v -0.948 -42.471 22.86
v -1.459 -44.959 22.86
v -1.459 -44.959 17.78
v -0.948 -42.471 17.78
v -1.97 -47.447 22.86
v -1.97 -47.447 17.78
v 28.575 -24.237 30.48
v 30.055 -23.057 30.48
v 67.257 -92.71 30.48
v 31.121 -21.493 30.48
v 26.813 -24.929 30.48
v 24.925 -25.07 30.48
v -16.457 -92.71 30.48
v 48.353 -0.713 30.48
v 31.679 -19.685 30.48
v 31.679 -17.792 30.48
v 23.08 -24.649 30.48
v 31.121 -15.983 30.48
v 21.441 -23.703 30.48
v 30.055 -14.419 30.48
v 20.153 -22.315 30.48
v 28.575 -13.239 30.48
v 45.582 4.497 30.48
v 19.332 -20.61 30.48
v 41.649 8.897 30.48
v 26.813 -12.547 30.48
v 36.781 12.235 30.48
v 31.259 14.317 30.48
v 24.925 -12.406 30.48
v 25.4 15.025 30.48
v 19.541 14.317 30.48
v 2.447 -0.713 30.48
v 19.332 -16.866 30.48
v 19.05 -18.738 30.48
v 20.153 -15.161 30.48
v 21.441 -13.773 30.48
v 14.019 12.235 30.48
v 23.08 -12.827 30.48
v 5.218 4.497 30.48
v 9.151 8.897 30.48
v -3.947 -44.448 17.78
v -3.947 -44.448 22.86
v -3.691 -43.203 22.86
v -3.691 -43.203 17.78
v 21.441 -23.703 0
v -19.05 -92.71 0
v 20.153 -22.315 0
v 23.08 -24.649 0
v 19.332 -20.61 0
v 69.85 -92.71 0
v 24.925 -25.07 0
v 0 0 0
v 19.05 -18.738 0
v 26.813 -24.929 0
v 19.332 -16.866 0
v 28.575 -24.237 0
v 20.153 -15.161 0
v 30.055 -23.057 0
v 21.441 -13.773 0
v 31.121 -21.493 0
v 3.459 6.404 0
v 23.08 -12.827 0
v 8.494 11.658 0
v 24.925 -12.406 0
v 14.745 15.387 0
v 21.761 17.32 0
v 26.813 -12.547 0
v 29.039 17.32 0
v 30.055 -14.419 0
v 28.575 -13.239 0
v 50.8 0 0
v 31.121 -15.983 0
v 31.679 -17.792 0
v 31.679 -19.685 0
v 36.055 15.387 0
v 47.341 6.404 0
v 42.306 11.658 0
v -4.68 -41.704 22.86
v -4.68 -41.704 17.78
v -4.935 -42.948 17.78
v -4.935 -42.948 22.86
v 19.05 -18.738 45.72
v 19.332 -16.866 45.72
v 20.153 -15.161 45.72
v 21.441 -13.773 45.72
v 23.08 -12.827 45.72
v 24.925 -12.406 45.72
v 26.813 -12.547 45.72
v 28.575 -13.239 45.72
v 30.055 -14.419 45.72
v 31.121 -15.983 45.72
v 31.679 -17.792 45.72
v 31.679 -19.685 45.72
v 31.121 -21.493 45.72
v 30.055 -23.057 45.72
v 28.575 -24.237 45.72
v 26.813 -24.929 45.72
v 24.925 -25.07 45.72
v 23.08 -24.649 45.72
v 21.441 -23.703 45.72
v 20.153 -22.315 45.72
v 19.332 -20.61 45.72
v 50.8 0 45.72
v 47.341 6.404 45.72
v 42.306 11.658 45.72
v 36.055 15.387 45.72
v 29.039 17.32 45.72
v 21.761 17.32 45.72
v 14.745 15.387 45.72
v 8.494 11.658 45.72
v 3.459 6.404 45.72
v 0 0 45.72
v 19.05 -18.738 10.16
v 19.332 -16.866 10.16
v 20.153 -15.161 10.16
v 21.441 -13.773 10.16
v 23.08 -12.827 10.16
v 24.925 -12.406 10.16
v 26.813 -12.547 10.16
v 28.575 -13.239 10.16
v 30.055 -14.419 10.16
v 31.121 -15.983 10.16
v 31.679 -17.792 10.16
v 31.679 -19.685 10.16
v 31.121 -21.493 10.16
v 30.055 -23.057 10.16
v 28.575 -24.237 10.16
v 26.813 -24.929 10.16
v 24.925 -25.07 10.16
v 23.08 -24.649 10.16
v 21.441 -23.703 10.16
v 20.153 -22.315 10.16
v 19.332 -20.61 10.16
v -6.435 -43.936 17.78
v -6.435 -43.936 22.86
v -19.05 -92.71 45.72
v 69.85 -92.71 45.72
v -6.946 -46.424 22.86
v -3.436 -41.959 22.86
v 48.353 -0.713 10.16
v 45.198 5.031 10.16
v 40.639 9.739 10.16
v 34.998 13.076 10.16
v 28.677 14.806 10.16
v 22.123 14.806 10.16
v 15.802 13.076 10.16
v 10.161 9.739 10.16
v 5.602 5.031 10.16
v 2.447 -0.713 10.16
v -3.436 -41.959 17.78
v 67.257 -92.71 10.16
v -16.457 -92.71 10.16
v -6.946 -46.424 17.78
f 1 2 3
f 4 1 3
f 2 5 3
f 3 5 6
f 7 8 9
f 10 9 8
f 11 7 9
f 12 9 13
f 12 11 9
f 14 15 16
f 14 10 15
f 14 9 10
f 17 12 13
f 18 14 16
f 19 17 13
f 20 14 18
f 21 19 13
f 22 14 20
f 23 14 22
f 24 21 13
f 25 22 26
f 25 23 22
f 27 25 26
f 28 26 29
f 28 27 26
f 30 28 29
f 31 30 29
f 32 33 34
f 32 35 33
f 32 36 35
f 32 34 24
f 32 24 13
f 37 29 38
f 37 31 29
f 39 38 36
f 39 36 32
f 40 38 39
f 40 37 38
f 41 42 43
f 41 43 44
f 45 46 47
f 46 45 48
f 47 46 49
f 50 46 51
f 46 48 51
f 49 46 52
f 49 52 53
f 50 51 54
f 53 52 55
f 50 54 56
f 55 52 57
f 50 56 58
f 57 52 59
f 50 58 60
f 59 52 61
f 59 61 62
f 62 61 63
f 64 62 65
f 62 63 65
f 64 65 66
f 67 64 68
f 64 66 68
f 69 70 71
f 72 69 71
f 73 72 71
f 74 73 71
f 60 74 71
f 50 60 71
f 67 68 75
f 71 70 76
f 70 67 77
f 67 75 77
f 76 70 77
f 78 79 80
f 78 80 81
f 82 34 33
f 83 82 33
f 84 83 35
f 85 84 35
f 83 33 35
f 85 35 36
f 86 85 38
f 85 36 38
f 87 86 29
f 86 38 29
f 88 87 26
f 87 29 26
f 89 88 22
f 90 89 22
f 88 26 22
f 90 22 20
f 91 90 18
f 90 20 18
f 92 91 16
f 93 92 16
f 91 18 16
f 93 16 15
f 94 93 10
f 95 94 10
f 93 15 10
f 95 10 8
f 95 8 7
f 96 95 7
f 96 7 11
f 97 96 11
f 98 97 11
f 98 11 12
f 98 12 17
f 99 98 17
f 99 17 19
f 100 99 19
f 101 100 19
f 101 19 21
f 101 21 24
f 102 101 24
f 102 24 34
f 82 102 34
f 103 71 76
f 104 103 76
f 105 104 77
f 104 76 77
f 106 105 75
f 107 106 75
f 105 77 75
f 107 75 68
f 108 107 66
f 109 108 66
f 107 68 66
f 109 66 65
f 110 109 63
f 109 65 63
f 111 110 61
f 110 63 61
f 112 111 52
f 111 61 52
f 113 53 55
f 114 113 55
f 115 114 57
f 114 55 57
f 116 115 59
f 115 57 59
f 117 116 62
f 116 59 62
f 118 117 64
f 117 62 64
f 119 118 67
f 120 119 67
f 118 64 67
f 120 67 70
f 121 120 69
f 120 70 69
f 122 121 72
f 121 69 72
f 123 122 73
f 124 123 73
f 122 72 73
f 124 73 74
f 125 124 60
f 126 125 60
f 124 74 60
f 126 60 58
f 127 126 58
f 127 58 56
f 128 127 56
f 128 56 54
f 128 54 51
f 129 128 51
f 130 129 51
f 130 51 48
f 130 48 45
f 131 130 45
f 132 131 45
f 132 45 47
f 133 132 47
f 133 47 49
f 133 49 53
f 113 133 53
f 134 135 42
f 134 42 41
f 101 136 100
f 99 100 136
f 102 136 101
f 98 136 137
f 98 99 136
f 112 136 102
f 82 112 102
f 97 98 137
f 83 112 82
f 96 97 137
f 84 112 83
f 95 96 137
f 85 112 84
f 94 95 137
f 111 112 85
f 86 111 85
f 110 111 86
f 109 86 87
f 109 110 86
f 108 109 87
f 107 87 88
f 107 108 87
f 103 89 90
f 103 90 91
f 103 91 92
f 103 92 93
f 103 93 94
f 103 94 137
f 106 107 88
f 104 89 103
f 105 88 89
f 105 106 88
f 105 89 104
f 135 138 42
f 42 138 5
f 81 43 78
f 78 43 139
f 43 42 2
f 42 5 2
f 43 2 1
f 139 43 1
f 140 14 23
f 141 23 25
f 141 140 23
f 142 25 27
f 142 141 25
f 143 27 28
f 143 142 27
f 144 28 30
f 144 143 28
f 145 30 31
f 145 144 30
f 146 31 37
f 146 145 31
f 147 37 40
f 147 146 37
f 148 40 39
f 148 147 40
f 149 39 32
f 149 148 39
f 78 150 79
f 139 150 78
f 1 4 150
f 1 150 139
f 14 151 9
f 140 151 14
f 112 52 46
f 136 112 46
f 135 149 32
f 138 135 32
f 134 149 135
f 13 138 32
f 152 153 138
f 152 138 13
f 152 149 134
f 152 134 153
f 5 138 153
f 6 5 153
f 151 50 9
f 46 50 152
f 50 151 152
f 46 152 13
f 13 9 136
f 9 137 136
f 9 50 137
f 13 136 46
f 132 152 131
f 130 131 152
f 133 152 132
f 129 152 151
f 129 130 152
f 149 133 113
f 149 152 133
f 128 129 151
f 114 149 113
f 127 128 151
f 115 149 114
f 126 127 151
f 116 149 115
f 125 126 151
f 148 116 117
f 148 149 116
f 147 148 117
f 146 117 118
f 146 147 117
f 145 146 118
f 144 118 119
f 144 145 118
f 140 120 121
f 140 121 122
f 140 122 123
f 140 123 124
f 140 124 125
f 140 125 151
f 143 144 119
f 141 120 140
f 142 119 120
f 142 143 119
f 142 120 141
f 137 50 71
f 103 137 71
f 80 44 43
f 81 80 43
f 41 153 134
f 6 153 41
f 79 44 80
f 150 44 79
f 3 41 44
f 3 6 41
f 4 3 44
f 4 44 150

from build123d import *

# Parameters (mm, degrees)
BOSS_EXTRUDE1_DEPTH      = 45.72
SHELL1_T                 = -2.54
SHELL1_THICKNESS_2_DEPTH = 7.62
SHELL1_THICKNESS_3_DEPTH = 7.62
BOSS_EXTRUDE2_DEPTH      = 5.08
SKETCH3_R                = 6.35
CUT_EXTRUDE1_DEPTH       = 45.72
SKETCH4_W                = 5.08
SKETCH4_H                = 2.54
BOSS_EXTRUDE3_DEPTH      = 5.08
SKETCH5_W                = 2.54
SKETCH5_H                = 5.08
BOSS_EXTRUDE4_DEPTH      = 2.54
SKETCH6_W                = 5.08
SKETCH6_H                = 1.27
BOSS_EXTRUDE5_DEPTH      = 1.27


with BuildPart() as part:
    # Sketch1 → Boss-Extrude1 (new body)
    with BuildSketch(Plane.XY):
        with BuildLine():
            Line((0, 0), (-19.05, -92.71))
            Line((-19.05, -92.71), (69.85, -92.71))
            Line((69.85, -92.71), (50.8, 0))
            ThreePointArc((50.8, 0), (25.4, 17.565060875), (0, 0))
        make_face()
    extrude(amount=BOSS_EXTRUDE1_DEPTH)

    # Shell1
    shell1_openings = [part.faces().sort_by_distance(p)[0] for p in [
        (25.4, -92.71, 22.86),
    ]]
    offset(amount=SHELL1_T, openings=shell1_openings, kind=Kind.INTERSECTION)

    # Shell1 thickness 2 face (on inner face of the shell) → Shell1 thickness 2 (add)
    with BuildSketch(Plane(origin=(25.4, -46.578295761, 43.18), x_dir=(1, 0, 0), z_dir=(0, 0, 1))):
        with BuildLine():
            Line((41.856932666, -46.131704239), (-41.856932666, -46.131704239))
            Line((-41.856932666, -46.131704239), (-22.953477125, 45.865112726))
            ThreePointArc((-22.953477125, 45.865112726), (0, 61.603356636), (22.953477125, 45.865112726))
            Line((22.953477125, 45.865112726), (41.856932666, -46.131704239))
        make_face()
    extrude(amount=-SHELL1_THICKNESS_2_DEPTH)

    # Shell1 thickness 3 face (on inner face of the shell) → Shell1 thickness 3 (add)
    with BuildSketch(Plane(origin=(25.4, -46.578295761, 2.54), x_dir=(-1, 0, 0), z_dir=(0, 0, -1))):
        with BuildLine():
            Line((41.856932666, -46.131704239), (-41.856932666, -46.131704239))
            Line((-41.856932666, -46.131704239), (-22.953477125, 45.865112726))
            ThreePointArc((-22.953477125, 45.865112726), (0, 61.603356636), (22.953477125, 45.865112726))
            Line((22.953477125, 45.865112726), (41.856932666, -46.131704239))
        make_face()
    extrude(amount=-SHELL1_THICKNESS_3_DEPTH)

    # Sketch2 → Boss-Extrude2 (add)
    with BuildSketch(Plane(origin=(0, 0, 35.56), x_dir=(-1, 0, 0), z_dir=(0, 0, -1))):
        with BuildLine():
            Line((-48.353477125, -0.713183035), (-67.256932666, -92.71))
            Line((-67.256932666, -92.71), (16.456932666, -92.71))
            Line((16.456932666, -92.71), (-2.446522875, -0.713183035))
            ThreePointArc((-2.446522875, -0.713183035), (-11.484590973, 10.712623327), (-25.4, 15.025060875))
            ThreePointArc((-25.4, 15.025060875), (-39.315409027, 10.712623327), (-48.353477125, -0.713183035))
        make_face()
    extrude(amount=BOSS_EXTRUDE2_DEPTH)

    # Sketch3 → Cut-Extrude1 (cut)
    with BuildSketch(Plane(origin=(0, 0, 0), x_dir=(-1, 0, 0), z_dir=(0, 0, -1))):
        with Locations((-25.4, -18.738085506)):
            Circle(SKETCH3_R)
    extrude(amount=-CUT_EXTRUDE1_DEPTH, mode=Mode.SUBTRACT)

    # Sketch4 → Boss-Extrude3 (add)
    with BuildSketch(Plane(origin=(2.488018693, -0.511236718, 0), x_dir=(0, 0, -1), z_dir=(0.979534919, -0.201274298, 0))):
        with Locations((-20.32, -45.602294641)):
            Rectangle(SKETCH4_W, SKETCH4_H)
    extrude(amount=BOSS_EXTRUDE3_DEPTH)

    # Sketch5 → Boss-Extrude4 (add)
    with BuildSketch(Plane(origin=(-8.922951498, -43.425030624, 0), x_dir=(0.979534919, -0.201274298, 0), z_dir=(0.201274298, 0.979534919, 0))):
        with Locations((6.35, -20.32)):
            Rectangle(SKETCH5_W, SKETCH5_H)
    extrude(amount=BOSS_EXTRUDE4_DEPTH)

    # Sketch6 → Boss-Extrude5 (add)
    with BuildSketch(Plane(origin=(4.976037387, -1.022473436, 0), x_dir=(0, 0, 1), z_dir=(-0.979534919, 0.201274298, 0))):
        with Locations((20.32, -42.427294641)):
            Rectangle(SKETCH6_W, SKETCH6_H)
    extrude(amount=BOSS_EXTRUDE5_DEPTH)


solid = part.part
